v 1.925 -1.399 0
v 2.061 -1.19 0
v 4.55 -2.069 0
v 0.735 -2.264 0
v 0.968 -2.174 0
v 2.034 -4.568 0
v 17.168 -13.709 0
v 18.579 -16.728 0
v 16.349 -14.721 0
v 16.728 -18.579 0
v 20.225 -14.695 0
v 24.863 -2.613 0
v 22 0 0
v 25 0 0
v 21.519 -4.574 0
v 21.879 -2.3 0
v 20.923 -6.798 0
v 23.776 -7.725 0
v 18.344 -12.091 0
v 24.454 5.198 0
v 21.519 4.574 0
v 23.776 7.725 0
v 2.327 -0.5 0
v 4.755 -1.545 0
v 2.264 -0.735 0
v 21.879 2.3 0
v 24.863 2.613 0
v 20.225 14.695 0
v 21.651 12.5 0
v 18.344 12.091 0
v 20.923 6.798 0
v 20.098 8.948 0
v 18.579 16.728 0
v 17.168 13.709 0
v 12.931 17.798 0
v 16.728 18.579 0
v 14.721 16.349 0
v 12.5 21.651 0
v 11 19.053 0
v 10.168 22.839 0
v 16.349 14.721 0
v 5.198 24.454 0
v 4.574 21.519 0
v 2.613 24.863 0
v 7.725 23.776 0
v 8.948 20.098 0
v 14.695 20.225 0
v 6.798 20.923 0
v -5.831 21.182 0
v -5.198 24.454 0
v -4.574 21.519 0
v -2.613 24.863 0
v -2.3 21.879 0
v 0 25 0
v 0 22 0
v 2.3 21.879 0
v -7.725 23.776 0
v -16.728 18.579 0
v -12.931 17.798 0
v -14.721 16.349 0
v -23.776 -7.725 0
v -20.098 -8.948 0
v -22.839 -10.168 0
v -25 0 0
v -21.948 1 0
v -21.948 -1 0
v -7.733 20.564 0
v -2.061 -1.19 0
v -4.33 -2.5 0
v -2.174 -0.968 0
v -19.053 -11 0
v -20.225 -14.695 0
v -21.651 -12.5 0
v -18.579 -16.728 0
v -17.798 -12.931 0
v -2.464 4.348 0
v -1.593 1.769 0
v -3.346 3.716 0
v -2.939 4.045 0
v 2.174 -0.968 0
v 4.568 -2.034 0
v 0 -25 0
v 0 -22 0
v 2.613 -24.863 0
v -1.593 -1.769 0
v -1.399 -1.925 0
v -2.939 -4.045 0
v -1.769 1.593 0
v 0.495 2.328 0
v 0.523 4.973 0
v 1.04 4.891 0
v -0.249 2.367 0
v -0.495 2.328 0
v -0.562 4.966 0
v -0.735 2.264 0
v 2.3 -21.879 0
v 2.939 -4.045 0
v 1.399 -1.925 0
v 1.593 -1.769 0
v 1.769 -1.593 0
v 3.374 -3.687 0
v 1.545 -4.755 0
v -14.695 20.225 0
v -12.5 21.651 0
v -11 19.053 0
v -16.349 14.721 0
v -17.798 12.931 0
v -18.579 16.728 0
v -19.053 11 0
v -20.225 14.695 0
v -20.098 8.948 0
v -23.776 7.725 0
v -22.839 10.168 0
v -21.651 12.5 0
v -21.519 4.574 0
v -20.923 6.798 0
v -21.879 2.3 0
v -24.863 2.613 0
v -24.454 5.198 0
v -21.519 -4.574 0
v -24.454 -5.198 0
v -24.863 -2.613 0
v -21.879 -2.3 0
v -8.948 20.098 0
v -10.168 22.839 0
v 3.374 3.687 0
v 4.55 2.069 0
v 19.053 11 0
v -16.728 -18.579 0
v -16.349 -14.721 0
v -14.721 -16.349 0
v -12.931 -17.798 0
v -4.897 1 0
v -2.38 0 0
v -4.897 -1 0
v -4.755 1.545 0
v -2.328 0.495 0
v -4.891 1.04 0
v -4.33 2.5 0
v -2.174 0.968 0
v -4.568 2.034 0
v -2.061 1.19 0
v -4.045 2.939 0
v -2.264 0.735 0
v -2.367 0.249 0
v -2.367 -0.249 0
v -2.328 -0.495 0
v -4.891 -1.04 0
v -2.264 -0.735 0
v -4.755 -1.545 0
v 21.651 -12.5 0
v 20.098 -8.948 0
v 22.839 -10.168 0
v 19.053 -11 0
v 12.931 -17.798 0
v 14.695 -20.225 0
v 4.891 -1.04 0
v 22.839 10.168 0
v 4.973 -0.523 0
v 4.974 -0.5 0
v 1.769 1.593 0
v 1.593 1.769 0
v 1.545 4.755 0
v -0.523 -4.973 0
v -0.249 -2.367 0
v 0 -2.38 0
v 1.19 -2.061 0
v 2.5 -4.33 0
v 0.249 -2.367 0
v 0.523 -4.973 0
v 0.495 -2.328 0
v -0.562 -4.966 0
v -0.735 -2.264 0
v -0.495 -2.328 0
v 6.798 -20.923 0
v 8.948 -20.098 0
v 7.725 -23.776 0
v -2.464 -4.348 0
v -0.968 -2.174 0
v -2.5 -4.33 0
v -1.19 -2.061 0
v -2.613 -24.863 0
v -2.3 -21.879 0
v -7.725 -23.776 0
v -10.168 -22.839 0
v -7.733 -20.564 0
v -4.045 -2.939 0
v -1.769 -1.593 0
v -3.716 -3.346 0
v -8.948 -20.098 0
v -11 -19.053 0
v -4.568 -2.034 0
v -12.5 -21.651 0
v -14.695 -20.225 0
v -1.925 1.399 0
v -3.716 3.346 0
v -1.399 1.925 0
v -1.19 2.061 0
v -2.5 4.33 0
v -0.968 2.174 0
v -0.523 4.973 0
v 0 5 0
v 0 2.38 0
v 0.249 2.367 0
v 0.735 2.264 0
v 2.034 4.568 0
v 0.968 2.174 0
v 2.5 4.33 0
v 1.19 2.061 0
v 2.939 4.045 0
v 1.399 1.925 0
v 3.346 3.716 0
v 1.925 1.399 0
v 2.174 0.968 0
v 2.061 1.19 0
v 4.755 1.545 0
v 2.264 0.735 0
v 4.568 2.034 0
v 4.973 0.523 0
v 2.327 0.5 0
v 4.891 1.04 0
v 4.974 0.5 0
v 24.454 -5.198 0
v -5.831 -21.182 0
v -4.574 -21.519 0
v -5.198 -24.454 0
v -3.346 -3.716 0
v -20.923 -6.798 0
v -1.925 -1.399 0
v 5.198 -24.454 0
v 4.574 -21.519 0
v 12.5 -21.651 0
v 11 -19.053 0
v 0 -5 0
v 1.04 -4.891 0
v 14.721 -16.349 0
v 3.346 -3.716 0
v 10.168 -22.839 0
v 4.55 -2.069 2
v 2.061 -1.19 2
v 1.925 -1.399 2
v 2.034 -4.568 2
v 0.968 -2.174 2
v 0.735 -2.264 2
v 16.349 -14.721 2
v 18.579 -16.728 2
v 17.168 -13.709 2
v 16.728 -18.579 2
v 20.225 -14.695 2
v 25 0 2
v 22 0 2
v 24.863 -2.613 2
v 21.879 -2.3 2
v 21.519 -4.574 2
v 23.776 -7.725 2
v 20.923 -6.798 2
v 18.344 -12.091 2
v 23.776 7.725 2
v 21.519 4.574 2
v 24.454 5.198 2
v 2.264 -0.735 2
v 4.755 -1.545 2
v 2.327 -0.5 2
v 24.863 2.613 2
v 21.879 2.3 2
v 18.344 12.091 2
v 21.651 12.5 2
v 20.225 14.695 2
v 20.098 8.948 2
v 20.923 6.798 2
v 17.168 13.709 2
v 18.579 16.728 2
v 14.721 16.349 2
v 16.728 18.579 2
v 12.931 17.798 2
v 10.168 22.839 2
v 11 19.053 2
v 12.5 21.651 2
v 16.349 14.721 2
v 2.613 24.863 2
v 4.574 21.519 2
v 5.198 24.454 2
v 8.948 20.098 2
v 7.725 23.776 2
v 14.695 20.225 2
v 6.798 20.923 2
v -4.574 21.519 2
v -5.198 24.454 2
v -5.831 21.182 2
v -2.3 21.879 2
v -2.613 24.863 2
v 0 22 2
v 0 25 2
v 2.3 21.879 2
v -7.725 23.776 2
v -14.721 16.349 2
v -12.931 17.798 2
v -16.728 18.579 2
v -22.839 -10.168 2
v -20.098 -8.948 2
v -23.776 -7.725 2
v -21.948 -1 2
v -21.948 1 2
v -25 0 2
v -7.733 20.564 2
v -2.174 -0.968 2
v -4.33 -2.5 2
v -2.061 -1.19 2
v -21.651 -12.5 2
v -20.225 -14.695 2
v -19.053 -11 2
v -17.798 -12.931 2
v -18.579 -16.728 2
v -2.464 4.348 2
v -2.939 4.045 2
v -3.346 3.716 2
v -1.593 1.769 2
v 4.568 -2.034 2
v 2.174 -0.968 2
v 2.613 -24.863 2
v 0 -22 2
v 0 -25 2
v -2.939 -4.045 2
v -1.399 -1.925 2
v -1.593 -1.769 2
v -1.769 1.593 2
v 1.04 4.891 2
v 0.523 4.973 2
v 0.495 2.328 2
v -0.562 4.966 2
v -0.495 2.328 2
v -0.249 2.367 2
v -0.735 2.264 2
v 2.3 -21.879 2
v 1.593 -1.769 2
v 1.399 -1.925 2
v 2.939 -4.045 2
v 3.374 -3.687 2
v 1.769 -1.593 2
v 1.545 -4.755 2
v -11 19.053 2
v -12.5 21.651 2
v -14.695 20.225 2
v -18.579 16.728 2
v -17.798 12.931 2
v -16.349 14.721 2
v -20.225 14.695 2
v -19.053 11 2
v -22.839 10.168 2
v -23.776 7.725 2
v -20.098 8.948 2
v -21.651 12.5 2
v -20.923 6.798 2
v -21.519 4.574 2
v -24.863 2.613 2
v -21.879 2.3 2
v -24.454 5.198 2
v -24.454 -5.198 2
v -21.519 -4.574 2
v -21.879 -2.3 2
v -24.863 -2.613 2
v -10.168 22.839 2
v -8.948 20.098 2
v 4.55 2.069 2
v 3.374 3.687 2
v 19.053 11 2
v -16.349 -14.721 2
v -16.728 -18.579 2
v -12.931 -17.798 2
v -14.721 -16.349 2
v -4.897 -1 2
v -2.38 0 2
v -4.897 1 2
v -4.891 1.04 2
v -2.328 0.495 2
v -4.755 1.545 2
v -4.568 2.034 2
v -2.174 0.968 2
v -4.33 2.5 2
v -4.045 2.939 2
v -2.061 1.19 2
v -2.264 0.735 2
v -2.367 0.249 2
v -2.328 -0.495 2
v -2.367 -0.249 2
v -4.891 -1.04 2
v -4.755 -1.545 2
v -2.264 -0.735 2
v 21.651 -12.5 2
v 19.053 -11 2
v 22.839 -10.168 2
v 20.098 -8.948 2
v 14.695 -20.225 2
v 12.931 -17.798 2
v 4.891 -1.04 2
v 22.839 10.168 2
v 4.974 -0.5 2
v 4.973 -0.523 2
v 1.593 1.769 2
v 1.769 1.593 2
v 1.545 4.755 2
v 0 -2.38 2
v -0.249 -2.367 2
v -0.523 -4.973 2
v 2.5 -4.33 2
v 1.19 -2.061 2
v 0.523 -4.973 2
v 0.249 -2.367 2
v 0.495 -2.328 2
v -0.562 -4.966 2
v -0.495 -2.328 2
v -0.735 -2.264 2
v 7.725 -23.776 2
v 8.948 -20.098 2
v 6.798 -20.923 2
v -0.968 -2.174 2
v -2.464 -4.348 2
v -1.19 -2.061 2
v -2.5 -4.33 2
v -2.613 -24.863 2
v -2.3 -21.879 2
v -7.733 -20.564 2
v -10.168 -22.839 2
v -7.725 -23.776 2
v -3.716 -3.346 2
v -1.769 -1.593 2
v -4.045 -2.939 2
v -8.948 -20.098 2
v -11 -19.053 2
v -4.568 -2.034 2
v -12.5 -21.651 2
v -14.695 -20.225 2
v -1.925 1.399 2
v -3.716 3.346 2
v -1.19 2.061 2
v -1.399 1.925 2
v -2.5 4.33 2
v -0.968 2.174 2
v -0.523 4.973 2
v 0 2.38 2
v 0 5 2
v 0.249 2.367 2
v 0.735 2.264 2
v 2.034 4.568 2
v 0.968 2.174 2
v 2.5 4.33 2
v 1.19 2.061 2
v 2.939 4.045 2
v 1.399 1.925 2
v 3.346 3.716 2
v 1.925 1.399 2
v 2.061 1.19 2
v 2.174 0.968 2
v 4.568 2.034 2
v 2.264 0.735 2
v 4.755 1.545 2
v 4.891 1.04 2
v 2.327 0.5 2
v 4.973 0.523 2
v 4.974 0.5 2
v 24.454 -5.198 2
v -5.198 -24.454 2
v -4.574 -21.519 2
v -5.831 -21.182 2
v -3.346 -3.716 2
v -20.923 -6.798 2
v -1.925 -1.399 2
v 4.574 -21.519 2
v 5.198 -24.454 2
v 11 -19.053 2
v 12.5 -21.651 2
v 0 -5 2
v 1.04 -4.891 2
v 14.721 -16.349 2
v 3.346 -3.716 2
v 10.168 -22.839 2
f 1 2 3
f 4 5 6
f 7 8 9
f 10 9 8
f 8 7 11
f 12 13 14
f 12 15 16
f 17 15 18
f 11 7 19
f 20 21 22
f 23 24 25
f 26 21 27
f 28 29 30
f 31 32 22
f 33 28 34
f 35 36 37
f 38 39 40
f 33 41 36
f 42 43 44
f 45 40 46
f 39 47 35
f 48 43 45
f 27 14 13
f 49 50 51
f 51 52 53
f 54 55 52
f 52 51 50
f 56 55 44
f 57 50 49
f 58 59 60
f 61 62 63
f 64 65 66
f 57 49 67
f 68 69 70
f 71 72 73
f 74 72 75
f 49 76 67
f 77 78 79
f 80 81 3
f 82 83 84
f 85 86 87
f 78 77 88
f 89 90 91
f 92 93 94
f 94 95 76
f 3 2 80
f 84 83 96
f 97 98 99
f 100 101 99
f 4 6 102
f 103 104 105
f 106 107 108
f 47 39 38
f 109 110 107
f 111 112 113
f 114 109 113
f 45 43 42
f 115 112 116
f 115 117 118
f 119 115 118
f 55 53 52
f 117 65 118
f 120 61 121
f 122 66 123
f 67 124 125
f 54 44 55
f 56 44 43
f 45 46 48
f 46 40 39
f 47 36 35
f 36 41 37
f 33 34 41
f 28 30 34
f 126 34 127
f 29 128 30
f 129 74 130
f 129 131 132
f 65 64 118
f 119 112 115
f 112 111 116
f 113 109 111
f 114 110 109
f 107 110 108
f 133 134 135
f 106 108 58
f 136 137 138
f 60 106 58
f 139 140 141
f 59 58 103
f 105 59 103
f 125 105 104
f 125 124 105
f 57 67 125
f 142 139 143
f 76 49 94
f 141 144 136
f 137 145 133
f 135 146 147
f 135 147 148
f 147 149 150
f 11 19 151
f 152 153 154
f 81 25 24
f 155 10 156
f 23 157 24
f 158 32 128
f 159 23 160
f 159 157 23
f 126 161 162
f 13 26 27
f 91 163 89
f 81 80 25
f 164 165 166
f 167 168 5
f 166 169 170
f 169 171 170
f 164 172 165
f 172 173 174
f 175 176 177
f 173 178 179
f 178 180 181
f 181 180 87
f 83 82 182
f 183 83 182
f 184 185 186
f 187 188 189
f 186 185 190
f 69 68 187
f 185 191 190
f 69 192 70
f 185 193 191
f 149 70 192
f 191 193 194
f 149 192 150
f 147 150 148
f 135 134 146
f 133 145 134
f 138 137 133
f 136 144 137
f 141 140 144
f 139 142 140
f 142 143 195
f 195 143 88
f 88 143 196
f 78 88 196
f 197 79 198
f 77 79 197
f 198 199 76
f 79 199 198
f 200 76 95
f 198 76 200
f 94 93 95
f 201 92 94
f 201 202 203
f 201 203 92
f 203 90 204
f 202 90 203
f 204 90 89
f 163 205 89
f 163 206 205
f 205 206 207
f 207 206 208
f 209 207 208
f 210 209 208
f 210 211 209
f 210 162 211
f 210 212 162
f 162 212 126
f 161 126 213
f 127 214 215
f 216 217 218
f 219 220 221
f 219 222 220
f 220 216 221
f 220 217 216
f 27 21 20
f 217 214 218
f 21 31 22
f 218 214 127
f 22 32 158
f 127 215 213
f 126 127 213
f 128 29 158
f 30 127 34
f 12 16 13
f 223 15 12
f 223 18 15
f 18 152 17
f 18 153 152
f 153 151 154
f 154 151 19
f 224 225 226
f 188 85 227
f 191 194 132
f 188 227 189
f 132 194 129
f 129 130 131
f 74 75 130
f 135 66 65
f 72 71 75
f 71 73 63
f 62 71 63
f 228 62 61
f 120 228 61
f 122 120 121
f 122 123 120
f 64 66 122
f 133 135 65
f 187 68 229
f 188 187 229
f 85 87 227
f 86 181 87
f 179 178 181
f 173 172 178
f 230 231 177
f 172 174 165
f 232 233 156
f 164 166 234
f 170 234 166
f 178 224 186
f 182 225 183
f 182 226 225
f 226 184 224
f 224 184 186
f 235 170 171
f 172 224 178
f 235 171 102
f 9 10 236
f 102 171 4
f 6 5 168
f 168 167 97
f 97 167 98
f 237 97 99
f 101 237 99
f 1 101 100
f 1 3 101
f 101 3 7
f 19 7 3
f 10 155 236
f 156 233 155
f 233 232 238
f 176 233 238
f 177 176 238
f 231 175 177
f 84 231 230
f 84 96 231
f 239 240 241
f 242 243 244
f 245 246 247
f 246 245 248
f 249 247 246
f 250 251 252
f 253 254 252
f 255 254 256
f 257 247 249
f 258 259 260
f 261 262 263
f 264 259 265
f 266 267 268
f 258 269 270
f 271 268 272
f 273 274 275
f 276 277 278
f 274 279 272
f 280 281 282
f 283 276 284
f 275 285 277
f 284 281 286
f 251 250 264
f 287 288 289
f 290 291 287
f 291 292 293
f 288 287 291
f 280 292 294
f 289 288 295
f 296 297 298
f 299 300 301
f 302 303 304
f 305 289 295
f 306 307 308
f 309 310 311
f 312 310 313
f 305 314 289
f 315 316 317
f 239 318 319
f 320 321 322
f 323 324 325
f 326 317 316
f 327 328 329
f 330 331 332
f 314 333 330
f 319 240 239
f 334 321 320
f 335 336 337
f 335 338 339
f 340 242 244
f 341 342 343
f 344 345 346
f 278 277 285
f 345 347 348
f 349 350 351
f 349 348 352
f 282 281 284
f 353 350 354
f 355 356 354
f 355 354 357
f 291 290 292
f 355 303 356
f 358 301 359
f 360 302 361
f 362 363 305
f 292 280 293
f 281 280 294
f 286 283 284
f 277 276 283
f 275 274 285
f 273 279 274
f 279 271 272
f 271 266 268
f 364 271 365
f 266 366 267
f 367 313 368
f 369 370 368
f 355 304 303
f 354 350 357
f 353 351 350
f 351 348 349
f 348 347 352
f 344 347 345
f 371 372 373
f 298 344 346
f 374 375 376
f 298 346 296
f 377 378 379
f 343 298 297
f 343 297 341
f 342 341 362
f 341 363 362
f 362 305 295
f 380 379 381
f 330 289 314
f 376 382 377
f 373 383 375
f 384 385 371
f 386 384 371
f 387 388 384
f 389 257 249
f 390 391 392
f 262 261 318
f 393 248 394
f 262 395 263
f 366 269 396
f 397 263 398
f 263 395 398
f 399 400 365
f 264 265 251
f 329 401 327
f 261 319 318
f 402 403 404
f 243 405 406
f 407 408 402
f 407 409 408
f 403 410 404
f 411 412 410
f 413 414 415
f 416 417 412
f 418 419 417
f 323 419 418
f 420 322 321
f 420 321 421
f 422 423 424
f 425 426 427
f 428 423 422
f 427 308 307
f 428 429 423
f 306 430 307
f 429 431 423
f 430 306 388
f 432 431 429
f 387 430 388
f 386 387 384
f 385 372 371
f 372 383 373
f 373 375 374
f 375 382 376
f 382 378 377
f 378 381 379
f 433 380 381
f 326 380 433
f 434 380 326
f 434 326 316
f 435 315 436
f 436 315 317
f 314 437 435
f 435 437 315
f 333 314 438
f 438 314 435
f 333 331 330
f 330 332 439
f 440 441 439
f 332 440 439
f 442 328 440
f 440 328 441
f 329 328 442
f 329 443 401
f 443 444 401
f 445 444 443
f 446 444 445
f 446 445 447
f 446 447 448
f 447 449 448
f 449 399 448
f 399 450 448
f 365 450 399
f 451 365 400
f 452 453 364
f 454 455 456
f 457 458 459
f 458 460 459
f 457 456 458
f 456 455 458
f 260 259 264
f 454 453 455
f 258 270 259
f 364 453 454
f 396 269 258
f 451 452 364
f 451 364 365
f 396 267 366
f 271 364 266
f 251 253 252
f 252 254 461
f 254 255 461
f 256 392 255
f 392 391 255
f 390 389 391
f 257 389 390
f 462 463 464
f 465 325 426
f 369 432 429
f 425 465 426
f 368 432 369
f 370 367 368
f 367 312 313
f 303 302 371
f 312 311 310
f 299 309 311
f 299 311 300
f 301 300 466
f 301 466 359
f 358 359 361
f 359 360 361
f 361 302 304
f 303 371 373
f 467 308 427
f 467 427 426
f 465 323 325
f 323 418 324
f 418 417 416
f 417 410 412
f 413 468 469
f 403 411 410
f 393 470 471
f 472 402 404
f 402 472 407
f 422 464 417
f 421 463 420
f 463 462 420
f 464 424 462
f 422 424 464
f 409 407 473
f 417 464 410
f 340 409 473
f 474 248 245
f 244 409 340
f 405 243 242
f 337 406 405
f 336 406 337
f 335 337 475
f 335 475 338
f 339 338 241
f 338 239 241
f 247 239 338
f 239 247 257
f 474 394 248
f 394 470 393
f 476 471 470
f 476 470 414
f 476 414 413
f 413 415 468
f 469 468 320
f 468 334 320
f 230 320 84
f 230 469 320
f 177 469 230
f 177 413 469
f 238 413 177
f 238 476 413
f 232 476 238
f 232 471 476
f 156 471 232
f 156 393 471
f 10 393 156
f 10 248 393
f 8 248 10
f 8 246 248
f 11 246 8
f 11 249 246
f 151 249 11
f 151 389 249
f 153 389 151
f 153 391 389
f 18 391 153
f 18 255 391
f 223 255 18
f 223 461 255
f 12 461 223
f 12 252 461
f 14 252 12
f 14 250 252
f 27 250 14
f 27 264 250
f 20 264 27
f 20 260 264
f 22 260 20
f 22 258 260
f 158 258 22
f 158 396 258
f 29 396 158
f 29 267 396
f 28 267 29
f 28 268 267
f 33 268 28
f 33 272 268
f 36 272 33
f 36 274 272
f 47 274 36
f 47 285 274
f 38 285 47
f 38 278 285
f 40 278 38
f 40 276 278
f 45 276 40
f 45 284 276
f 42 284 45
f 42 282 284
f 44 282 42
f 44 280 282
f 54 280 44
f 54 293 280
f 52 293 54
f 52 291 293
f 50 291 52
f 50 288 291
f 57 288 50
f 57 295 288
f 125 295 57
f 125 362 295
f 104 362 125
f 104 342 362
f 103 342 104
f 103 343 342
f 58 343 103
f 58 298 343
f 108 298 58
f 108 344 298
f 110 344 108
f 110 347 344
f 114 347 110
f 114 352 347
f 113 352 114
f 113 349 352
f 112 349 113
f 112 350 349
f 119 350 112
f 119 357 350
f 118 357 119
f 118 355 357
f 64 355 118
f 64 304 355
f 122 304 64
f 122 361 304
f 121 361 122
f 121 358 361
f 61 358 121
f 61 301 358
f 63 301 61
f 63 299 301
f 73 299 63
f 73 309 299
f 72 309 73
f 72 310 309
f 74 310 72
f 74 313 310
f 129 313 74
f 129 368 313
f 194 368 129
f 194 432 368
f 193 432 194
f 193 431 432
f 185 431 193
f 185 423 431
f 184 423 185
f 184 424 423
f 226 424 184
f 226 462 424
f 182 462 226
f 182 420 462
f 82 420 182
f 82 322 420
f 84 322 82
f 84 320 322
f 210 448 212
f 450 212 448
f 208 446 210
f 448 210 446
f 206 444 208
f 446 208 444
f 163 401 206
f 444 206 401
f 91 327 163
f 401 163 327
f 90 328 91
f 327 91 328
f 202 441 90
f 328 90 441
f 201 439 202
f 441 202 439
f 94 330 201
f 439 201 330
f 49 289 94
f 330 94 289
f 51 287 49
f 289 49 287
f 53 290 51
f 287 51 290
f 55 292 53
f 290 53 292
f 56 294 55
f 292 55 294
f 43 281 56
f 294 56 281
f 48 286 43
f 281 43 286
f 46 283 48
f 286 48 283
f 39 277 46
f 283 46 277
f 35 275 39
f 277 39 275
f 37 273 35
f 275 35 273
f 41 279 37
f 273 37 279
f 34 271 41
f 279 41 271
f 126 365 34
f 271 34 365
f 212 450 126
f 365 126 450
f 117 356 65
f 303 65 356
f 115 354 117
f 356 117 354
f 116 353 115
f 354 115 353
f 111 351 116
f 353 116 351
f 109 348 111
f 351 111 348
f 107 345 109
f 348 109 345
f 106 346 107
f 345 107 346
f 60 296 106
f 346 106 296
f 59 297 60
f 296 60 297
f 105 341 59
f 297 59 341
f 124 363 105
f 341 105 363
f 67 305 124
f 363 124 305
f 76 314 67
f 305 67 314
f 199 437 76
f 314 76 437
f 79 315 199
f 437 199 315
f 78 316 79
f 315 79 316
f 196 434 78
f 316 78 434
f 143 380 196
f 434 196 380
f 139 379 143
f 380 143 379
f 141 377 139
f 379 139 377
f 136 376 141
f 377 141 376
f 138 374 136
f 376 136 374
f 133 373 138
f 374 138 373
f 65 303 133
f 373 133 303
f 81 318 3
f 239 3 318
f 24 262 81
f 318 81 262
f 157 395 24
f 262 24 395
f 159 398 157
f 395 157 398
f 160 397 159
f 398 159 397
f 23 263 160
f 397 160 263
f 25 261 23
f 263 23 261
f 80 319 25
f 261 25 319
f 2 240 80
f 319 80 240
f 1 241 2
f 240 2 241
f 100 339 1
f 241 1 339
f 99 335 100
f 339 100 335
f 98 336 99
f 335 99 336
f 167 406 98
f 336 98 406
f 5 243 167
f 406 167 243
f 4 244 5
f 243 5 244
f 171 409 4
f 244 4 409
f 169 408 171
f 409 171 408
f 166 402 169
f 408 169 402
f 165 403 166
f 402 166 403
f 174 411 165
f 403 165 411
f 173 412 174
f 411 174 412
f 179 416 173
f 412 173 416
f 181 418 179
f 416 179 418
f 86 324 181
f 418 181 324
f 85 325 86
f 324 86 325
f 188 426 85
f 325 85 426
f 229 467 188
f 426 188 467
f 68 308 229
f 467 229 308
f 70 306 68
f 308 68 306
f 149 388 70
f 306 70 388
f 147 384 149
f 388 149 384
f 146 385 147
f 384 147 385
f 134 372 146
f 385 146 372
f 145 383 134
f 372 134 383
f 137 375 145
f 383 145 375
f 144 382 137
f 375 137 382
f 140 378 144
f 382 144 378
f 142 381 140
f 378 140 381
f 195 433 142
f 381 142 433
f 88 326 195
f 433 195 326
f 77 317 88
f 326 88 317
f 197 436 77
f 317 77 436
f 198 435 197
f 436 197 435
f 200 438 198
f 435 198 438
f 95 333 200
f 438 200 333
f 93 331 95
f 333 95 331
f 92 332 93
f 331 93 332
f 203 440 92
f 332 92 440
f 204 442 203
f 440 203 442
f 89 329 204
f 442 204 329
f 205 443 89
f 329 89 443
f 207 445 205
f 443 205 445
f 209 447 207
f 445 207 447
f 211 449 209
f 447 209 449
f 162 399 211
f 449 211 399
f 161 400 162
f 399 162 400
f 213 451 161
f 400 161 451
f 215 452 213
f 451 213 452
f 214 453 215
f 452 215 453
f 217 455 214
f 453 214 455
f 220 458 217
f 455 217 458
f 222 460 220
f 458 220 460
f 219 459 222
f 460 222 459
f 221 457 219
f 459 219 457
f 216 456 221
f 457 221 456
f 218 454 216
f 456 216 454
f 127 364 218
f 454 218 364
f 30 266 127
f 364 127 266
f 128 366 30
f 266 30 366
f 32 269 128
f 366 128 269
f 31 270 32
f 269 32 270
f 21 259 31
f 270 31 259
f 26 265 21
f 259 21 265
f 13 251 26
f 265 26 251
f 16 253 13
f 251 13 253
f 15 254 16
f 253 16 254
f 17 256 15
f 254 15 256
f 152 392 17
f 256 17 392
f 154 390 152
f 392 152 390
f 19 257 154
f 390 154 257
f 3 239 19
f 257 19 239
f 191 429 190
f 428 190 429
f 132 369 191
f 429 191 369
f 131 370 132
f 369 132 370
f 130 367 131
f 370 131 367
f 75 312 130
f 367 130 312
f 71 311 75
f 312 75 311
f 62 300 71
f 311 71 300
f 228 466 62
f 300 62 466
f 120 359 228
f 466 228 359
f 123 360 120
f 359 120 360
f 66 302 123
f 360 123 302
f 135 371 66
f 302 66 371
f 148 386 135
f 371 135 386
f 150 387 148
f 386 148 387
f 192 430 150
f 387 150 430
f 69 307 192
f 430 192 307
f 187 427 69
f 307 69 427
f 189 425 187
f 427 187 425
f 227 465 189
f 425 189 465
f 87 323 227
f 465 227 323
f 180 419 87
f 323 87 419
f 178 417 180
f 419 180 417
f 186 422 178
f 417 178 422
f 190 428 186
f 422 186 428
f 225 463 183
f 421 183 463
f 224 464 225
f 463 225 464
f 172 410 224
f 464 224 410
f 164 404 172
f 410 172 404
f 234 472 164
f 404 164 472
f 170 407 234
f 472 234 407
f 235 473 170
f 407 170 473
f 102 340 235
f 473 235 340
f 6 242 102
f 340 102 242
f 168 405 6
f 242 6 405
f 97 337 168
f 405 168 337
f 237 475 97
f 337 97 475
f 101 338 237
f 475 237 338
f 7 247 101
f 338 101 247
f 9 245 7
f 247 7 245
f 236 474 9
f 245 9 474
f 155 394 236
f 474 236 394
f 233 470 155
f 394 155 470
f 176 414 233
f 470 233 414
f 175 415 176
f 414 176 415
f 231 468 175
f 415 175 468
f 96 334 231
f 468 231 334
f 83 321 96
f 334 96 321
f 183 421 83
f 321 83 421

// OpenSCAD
d=4.76;n=5;
$fa=6;$fs=.1;
linear_extrude(2){
	difference(){
		circle(25);
		circle(22);
	}
	difference(){
		circle(5);
		circle(d/2);
		translate([0,-.5])square([100,1]);
	}
	for(i=[0:n-1])rotate(360*i/n+180)translate([d/2,-1])square([22-d/2,2]);
	}
